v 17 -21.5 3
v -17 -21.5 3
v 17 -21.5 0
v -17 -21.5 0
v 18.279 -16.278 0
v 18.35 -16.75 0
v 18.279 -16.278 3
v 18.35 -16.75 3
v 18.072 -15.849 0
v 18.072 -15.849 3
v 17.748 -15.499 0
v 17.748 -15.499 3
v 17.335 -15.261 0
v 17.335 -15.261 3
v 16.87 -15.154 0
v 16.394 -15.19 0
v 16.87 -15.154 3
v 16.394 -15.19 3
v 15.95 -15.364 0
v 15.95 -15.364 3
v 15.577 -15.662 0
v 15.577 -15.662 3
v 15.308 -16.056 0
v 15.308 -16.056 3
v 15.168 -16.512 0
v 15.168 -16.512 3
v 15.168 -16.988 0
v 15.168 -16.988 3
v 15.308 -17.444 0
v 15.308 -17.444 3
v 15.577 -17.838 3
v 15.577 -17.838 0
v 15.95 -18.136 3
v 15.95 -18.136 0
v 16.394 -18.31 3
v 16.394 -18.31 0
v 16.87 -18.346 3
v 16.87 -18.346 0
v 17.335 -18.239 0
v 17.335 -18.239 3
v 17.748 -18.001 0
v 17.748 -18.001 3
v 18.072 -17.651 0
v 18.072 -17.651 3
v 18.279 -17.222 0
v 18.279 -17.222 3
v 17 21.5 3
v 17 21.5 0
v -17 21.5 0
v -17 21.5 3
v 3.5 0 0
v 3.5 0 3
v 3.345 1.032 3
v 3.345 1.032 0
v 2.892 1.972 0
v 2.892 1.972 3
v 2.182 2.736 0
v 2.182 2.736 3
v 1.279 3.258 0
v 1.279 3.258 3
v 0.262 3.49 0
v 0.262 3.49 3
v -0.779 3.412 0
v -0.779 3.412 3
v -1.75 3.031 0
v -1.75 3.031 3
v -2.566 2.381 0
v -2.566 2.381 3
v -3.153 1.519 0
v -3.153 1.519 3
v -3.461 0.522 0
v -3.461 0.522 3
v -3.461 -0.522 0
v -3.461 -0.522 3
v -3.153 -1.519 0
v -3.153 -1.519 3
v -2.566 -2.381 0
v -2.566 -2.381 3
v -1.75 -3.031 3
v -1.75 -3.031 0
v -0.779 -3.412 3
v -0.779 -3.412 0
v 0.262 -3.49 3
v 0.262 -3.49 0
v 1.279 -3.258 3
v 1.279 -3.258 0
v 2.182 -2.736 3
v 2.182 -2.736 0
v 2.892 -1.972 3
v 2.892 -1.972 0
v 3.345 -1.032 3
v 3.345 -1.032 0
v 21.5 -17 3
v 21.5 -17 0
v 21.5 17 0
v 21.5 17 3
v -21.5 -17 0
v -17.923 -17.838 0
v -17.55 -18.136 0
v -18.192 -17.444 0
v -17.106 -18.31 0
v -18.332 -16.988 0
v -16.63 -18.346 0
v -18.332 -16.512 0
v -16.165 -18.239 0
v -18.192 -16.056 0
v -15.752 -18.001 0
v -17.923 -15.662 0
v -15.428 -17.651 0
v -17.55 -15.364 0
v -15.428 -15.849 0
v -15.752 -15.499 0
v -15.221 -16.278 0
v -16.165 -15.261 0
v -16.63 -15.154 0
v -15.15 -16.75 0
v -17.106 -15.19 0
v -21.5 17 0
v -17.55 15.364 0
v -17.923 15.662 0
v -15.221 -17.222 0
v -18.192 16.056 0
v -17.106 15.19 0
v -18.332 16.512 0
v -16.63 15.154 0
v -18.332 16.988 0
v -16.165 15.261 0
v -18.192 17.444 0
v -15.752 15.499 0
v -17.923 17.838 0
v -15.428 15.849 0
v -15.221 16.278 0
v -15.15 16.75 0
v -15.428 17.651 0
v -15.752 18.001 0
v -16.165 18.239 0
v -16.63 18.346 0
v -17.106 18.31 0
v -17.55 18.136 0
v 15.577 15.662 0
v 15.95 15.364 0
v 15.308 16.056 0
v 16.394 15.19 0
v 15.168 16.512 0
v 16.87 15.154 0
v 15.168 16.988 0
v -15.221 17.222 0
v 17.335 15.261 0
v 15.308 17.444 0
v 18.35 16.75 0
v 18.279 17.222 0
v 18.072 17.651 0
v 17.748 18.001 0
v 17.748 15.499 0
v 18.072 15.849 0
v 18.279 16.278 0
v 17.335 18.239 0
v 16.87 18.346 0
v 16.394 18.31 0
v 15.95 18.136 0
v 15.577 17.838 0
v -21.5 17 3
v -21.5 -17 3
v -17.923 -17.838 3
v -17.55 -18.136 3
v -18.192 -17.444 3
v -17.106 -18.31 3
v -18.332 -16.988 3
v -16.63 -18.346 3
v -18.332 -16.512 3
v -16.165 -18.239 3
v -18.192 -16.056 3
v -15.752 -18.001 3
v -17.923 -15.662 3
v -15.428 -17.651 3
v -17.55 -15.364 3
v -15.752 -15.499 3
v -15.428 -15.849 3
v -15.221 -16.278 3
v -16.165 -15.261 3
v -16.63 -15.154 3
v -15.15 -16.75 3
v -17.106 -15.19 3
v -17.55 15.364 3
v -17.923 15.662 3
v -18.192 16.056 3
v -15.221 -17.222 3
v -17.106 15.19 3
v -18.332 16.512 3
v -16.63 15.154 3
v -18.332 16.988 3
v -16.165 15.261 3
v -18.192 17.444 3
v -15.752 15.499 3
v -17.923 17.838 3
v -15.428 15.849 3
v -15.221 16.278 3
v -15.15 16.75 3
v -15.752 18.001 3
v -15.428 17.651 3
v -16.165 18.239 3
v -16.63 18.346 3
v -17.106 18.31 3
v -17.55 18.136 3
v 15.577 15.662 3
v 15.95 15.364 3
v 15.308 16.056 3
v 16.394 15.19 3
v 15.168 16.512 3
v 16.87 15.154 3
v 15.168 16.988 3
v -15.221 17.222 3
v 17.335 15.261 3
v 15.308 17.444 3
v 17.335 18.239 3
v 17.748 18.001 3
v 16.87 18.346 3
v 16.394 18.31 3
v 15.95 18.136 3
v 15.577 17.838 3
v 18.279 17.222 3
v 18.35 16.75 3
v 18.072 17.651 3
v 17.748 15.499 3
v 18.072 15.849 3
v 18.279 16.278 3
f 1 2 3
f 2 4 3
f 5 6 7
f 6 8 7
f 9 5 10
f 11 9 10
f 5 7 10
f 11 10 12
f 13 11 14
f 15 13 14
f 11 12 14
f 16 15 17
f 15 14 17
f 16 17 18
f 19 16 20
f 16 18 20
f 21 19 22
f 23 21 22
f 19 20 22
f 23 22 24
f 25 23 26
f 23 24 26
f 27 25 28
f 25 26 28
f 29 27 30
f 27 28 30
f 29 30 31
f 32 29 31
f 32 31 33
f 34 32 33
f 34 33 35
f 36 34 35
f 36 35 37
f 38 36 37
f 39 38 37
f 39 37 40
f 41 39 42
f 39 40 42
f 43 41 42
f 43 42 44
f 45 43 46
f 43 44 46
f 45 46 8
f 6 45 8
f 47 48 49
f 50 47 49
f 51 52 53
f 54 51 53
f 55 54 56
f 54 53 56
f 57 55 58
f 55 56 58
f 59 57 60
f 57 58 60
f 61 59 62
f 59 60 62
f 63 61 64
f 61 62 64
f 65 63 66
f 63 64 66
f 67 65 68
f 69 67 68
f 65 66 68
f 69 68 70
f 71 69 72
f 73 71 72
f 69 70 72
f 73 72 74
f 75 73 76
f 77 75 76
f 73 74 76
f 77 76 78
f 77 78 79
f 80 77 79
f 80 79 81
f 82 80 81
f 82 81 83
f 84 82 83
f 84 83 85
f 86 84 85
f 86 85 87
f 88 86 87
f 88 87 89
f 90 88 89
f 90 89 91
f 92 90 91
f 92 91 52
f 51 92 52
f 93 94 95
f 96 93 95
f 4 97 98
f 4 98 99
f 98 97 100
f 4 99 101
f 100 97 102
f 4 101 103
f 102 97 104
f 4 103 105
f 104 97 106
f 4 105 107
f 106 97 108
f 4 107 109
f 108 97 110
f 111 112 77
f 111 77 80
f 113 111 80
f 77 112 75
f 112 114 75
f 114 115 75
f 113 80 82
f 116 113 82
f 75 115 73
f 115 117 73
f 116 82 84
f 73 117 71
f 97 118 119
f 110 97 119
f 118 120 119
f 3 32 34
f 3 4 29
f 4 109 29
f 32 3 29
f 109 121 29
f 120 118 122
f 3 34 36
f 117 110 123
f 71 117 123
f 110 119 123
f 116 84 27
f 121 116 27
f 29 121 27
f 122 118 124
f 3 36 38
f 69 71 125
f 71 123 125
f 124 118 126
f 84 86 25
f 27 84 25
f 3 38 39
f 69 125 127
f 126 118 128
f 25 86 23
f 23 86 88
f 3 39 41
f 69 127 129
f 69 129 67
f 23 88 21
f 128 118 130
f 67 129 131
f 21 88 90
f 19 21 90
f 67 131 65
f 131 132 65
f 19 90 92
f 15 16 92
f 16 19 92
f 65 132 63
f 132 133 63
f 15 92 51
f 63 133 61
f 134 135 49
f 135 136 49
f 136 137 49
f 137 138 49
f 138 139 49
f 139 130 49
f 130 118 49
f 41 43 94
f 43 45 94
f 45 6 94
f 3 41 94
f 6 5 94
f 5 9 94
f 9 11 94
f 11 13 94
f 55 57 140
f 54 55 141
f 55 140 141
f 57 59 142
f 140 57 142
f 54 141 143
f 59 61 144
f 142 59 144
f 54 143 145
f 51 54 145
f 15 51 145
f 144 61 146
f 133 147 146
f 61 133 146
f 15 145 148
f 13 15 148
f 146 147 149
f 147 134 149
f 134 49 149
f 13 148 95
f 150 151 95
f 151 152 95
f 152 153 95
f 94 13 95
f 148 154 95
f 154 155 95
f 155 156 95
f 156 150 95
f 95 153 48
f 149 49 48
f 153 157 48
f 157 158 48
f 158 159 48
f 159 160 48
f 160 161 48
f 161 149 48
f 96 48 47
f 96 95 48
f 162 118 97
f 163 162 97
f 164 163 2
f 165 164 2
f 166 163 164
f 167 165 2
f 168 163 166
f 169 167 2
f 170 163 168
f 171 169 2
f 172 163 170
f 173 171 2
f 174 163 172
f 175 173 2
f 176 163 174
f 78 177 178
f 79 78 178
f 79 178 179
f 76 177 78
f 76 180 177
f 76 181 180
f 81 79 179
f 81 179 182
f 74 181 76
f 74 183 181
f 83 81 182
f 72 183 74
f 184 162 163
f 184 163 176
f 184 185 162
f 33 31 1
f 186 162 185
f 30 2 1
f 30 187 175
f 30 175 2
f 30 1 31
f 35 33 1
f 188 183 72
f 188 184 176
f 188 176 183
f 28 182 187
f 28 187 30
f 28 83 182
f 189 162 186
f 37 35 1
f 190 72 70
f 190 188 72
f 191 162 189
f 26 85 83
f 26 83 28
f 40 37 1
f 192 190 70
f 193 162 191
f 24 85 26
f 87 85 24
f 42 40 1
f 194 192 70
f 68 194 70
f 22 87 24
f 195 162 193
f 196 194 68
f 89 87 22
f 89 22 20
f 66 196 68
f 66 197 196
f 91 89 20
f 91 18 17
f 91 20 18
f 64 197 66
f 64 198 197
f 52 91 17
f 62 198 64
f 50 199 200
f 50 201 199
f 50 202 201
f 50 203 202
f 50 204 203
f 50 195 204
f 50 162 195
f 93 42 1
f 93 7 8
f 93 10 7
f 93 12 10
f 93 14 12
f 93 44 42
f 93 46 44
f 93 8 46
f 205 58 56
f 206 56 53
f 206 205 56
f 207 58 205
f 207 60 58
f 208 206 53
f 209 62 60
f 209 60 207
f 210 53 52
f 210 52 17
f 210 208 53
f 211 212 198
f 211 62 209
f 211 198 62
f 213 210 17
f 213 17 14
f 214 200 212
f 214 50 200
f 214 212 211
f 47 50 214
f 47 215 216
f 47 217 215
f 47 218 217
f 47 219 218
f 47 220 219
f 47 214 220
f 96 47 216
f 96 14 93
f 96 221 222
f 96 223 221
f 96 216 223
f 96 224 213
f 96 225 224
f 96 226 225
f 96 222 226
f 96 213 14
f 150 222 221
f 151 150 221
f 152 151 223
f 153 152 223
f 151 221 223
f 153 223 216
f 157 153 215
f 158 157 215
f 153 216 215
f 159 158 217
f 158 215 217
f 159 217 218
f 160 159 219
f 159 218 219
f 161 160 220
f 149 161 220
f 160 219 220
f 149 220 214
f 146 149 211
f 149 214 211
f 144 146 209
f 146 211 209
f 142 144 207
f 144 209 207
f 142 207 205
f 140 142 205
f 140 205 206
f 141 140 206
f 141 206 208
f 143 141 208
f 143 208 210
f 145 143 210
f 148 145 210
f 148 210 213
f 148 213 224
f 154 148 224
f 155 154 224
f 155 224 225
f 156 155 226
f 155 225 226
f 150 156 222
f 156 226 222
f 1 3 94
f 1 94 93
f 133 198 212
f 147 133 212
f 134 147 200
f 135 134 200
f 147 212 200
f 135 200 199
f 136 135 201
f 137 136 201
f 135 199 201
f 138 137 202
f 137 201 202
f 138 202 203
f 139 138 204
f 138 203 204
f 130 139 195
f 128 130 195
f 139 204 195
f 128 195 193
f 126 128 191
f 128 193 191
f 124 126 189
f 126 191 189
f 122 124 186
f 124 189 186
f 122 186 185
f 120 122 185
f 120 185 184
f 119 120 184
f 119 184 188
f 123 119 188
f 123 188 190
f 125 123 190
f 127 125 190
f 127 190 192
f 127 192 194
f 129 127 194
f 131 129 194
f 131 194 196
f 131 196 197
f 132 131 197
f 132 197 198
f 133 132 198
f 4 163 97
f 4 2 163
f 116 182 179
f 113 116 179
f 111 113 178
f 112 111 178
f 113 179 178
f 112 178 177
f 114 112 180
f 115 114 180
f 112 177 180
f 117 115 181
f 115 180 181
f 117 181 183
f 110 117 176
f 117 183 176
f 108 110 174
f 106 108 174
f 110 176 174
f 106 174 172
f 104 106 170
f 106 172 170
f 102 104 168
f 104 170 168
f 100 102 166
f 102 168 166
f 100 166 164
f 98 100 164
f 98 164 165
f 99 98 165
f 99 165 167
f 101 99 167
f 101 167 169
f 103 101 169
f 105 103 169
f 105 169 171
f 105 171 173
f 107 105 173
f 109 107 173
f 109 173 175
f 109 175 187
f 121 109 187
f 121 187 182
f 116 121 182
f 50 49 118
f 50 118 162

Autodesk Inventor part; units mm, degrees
ref_plane "YZ Plane" through (0, 0, 0) normal (1, 0, 0) x (0, 1, 0)
ref_plane "XZ Plane" through (0, 0, 0) normal (0, 1, 0) x (-1, 0, 0)
ref_plane "XY Plane" through (0, 0, 0) normal (0, 0, 1) x (1, 0, 0)
sketch "Sketch1" plane through (0, 0, 0) normal (0, 0, 1) x (1, 0, 0)
  line L0 (-21.5, -21.5) -> (21.5, -21.5)
  line L1 (21.5, -21.5) -> (21.5, 21.5)
  line L2 (21.5, 21.5) -> (-21.5, 21.5)
  line L3 (-21.5, 21.5) -> (-21.5, -21.5)
  line L4 (-21.5, -21.5) -> (21.5, 21.5) construction
  line L5 (21.5, -21.5) -> (-21.5, 21.5) construction
  point P0 (0, 0)
  dimension "d0" = 43
  dimension "d1" = 43
extrude "Plate1" add sketch "Sketch1" along normal blind 3
chamfer "Corner Chamfer1" distance 4.5 angle 45 4 edges at (21.5, 21.5, 1.5) (-21.5, 21.5, 1.5) (-21.5, -21.5, 1.5) (21.5, -21.5, 1.5)
sketch "Sketch2" plane through (0, 0, 3) normal (0, 0, 1) x (1, 0, 0)
  line L0 (-17, 21.5) -> (17, 21.5) projected
  line L1 (0, 21.5) -> (0, -21.5)
  line L2 (17, -21.5) -> (-17, -21.5) projected
  line L3 (-21.5, -17) -> (-21.5, 17) projected
  line L4 (-21.5, 0) -> (21.5, 0)
  line L5 (21.5, 17) -> (21.5, -17) projected
  circle A0 centre (-16.75, 16.75) radius 1.6
  circle A1 centre (16.75, 16.75) radius 1.6
  circle A2 centre (-16.75, -16.75) radius 1.6
  circle A3 centre (16.75, -16.75) radius 1.6
  circle A4 centre (0, 0) radius 3.5
  dimension "d6" = 3.2
  dimension "d7" = 33.5
  dimension "d8" = 33.5
  dimension "d11" = 7
extrude "Cut1" cut sketch "Sketch2" against normal blind 3
equation "\"d9\" = Thickness"
equation "\"d2\" = Thickness"
equation "\"BendRadius\" = Thickness"
equation "\"BendReliefWidth\" = Thickness"
equation "\"BendReliefDepth\" = 0.5 * Thickness"
equation "\"CornerReliefSize\" = 4 * Thickness"
equation "\"MinimumRemnant\" = 2 * Thickness"
equation "\"TransitionRadius\" = BendRadius"
equation "\"JacobiRadiusSize\" = BendRadius"
equation "\"GapSize\" = Thickness"
equation "\"Thickness\" = 3"
properties part number "DC Motor Fixation"
